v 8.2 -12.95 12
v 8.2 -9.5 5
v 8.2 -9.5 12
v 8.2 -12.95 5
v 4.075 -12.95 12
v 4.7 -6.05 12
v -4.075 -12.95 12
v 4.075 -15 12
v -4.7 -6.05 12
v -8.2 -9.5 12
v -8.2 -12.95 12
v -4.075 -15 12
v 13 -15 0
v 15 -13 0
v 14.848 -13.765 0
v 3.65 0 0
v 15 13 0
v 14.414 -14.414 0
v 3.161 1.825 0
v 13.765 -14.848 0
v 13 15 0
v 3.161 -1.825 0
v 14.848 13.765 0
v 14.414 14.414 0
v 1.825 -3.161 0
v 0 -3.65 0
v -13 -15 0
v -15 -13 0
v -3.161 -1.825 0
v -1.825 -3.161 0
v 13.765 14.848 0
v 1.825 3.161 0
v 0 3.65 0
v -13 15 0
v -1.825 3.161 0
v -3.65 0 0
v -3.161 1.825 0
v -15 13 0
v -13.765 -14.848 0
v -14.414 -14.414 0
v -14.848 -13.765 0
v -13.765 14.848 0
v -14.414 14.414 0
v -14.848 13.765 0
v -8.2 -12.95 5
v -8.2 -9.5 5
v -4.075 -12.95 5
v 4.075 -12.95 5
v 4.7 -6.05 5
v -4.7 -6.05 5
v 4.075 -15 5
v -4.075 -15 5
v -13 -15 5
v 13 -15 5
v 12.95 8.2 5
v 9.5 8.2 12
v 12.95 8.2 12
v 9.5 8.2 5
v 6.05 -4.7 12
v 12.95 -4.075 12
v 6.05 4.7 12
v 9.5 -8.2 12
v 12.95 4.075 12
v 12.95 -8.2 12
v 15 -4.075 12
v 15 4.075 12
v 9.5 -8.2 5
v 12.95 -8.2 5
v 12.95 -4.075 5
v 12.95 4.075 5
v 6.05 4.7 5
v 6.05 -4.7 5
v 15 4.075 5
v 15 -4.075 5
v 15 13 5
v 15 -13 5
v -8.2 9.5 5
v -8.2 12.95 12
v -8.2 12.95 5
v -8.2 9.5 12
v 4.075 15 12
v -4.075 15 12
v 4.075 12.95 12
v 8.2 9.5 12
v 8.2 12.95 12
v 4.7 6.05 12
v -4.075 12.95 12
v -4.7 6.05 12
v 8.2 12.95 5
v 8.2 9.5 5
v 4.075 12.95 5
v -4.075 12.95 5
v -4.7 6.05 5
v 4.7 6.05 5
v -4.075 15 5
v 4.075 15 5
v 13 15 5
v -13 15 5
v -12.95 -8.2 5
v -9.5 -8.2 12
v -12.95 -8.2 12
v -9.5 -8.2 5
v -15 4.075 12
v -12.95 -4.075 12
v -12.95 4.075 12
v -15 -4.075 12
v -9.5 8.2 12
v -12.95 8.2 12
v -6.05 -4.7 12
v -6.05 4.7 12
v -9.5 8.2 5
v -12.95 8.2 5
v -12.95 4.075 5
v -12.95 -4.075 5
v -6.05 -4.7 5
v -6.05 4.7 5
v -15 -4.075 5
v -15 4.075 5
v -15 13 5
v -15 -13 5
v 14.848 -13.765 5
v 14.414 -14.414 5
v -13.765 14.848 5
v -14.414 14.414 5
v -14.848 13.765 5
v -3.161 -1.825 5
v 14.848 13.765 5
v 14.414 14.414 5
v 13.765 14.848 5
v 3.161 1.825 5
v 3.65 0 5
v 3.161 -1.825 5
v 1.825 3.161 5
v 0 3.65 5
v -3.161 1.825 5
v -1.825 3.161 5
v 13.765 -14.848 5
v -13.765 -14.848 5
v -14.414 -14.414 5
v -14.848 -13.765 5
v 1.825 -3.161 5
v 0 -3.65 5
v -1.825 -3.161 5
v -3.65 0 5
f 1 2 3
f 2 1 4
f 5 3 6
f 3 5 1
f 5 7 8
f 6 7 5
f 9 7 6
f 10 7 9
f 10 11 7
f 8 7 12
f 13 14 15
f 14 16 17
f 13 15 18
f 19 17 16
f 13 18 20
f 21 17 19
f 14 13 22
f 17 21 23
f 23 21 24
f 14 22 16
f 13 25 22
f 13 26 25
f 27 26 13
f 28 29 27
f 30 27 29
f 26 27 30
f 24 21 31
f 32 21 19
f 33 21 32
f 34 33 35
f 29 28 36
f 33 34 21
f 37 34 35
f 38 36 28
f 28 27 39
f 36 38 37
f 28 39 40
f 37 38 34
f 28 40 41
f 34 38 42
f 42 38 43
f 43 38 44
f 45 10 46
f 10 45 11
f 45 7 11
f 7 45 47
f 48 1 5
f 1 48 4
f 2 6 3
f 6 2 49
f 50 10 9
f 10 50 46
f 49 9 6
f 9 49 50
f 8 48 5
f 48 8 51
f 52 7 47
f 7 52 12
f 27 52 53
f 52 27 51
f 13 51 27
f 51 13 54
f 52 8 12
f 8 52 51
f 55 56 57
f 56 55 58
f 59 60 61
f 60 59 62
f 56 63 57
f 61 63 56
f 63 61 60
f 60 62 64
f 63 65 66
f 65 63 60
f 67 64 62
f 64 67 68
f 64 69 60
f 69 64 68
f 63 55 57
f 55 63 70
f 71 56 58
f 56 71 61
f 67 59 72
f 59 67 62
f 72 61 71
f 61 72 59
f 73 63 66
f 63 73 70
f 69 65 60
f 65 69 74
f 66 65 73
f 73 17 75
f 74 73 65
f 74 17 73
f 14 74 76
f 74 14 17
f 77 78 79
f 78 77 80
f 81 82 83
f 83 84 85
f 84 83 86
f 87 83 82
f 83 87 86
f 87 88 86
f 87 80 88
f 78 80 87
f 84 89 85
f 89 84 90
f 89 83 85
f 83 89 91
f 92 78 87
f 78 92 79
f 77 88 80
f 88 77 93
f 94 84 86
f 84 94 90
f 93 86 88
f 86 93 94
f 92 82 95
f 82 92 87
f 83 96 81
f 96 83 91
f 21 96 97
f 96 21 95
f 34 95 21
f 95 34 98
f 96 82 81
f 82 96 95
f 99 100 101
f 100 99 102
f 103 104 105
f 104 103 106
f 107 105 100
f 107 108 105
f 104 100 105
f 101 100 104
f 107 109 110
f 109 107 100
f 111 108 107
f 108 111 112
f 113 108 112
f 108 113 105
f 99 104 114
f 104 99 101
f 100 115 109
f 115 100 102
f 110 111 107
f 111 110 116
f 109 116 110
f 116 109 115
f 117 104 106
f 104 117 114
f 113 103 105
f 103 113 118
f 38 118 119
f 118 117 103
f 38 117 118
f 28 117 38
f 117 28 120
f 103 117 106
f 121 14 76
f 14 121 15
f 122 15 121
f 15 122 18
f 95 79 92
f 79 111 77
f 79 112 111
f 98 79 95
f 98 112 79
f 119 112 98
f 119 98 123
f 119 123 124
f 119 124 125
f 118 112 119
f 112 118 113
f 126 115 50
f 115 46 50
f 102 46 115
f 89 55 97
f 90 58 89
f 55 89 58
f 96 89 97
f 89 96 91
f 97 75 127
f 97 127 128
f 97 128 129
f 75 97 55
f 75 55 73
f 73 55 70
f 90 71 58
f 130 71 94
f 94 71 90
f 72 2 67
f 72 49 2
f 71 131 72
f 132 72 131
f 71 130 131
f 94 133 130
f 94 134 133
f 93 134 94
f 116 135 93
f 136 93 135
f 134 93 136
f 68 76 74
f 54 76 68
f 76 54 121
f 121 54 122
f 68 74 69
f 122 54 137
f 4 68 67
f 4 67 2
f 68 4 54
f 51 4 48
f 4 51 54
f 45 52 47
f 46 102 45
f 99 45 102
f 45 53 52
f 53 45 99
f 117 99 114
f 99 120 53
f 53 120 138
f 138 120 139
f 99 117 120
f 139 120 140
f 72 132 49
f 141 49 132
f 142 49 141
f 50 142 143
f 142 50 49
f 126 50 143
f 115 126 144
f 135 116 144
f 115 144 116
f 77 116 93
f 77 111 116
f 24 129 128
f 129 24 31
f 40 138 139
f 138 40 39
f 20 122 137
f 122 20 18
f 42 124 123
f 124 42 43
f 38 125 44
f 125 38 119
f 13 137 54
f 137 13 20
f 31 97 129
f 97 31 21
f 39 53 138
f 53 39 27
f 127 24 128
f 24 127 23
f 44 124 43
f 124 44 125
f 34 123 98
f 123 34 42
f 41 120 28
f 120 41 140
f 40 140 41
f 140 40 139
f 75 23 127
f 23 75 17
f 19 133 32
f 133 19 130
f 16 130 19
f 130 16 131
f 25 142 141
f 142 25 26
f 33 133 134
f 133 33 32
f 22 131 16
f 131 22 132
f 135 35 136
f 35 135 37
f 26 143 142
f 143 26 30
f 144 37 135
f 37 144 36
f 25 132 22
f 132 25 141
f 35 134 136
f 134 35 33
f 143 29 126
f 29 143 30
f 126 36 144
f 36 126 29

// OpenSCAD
/* [Nominal Extrusion Dimensions] */

// Nominal width of the extrusion (i.e. 3030 = 30mm)
extrusion_width=30;

// Nominal width of the outer slot
slot_width=8.25;

// Nominal depth / height of the outer slot
slot_height=2.0;

// Nominal width of the t-slot channel at the top of the channel
tslot_top_width=16.5;

// Nominal height of the square portion of the t-slot channel
tslot_cube_height=3.5;

// Nominal height of the trapezoid portion of the t-slot channel
tslot_trap_height=3.5;

/* [End Cap Dimensions] */

// The amount of "margin" or gap around the tabs of the endcap (0.0 - need a hammer; 0.2 - snug; 0.5 - very loose)
undersize=0.05; // [0.0:0.05:0.5]

// Thickness of the cover / endcap
cover_thickness=5.0;

// Corner rounding diameter (in mm)
corner_rounding=2.0;

// Hole size (0 for no hole, otherwize specify exact desired diameter)
hole_size=7.3;

// Overall height of the tabs / inserts
tab_height=7;

/* [Hidden] */

// Nominal width of the t-slot channel at the bottom of the channel
tslot_bottom_width=tslot_top_width-tslot_trap_height*2;  // Because the angle of the trapezoid sides needs to be at 45 degrees, the triangle on each side is an isocolese triangle. Therefore the width of the top of the trapezoid is the bottom width - 2 times the height of the trapezoid


difference() {
	union() {
        
        // CREATE 4 SIDES OF COVER INSERTS
		for (a=[0:3])
			rotate([0,0,90*a])
				translate([0,-extrusion_width/2,0])
					t_slot();
		
        // CREATE COVER BASE WITH ROUNDED CORNERS
		translate([-extrusion_width/2+corner_rounding, -extrusion_width/2+corner_rounding,0])
			minkowski() {
				cube([extrusion_width-corner_rounding*2,extrusion_width-corner_rounding*2,cover_thickness-1]);
				cylinder(r=corner_rounding, h=1, $fn=16);
			}
	}
    
    // CREATE HOLE IN COVER
	cylinder(r=hole_size/2, h=cover_thickness*4, center=true);
}

module t_slot() {
    
    // CREATE SLOT
	translate([-slot_width/2+undersize,0,0])
		cube([slot_width-undersize*2, slot_height+undersize, tab_height+cover_thickness]);
    
    if (tslot_cube_height == 0) {
        
        // CREATE T-SLOT CHANNEL (TRAPEZOID SECTION)
        translate([0,slot_height+undersize,0])
            linear_extrude(height=tab_height+cover_thickness)
                trapezoid(bottom=tslot_top_width-undersize*2, top=tslot_bottom_width-undersize*2, height=tslot_trap_height-undersize*2);
        
    }
    
    else {
        
        // CREATE T-SLOT CHANNEL (CUBE SECTION)
        translate([-tslot_top_width/2+undersize,slot_height+undersize,0])
            cube([tslot_top_width-undersize*2,tslot_cube_height-undersize,tab_height+cover_thickness]);
        
        // CREATE T-SLOT CHANNEL (TRAPEZOID SECTION)
        translate([0,slot_height+tslot_cube_height,0])
            linear_extrude(height=tab_height+cover_thickness)
                trapezoid(bottom=tslot_top_width-undersize*2, top=tslot_bottom_width-undersize*2, height=tslot_trap_height-undersize);
    }
}


module trapezoid(bottom=10, top=5, height=2)
{
	polygon(points=[[-bottom/2,0],[bottom/2,0],[top/2,height],[-top/2,height]]);
}
